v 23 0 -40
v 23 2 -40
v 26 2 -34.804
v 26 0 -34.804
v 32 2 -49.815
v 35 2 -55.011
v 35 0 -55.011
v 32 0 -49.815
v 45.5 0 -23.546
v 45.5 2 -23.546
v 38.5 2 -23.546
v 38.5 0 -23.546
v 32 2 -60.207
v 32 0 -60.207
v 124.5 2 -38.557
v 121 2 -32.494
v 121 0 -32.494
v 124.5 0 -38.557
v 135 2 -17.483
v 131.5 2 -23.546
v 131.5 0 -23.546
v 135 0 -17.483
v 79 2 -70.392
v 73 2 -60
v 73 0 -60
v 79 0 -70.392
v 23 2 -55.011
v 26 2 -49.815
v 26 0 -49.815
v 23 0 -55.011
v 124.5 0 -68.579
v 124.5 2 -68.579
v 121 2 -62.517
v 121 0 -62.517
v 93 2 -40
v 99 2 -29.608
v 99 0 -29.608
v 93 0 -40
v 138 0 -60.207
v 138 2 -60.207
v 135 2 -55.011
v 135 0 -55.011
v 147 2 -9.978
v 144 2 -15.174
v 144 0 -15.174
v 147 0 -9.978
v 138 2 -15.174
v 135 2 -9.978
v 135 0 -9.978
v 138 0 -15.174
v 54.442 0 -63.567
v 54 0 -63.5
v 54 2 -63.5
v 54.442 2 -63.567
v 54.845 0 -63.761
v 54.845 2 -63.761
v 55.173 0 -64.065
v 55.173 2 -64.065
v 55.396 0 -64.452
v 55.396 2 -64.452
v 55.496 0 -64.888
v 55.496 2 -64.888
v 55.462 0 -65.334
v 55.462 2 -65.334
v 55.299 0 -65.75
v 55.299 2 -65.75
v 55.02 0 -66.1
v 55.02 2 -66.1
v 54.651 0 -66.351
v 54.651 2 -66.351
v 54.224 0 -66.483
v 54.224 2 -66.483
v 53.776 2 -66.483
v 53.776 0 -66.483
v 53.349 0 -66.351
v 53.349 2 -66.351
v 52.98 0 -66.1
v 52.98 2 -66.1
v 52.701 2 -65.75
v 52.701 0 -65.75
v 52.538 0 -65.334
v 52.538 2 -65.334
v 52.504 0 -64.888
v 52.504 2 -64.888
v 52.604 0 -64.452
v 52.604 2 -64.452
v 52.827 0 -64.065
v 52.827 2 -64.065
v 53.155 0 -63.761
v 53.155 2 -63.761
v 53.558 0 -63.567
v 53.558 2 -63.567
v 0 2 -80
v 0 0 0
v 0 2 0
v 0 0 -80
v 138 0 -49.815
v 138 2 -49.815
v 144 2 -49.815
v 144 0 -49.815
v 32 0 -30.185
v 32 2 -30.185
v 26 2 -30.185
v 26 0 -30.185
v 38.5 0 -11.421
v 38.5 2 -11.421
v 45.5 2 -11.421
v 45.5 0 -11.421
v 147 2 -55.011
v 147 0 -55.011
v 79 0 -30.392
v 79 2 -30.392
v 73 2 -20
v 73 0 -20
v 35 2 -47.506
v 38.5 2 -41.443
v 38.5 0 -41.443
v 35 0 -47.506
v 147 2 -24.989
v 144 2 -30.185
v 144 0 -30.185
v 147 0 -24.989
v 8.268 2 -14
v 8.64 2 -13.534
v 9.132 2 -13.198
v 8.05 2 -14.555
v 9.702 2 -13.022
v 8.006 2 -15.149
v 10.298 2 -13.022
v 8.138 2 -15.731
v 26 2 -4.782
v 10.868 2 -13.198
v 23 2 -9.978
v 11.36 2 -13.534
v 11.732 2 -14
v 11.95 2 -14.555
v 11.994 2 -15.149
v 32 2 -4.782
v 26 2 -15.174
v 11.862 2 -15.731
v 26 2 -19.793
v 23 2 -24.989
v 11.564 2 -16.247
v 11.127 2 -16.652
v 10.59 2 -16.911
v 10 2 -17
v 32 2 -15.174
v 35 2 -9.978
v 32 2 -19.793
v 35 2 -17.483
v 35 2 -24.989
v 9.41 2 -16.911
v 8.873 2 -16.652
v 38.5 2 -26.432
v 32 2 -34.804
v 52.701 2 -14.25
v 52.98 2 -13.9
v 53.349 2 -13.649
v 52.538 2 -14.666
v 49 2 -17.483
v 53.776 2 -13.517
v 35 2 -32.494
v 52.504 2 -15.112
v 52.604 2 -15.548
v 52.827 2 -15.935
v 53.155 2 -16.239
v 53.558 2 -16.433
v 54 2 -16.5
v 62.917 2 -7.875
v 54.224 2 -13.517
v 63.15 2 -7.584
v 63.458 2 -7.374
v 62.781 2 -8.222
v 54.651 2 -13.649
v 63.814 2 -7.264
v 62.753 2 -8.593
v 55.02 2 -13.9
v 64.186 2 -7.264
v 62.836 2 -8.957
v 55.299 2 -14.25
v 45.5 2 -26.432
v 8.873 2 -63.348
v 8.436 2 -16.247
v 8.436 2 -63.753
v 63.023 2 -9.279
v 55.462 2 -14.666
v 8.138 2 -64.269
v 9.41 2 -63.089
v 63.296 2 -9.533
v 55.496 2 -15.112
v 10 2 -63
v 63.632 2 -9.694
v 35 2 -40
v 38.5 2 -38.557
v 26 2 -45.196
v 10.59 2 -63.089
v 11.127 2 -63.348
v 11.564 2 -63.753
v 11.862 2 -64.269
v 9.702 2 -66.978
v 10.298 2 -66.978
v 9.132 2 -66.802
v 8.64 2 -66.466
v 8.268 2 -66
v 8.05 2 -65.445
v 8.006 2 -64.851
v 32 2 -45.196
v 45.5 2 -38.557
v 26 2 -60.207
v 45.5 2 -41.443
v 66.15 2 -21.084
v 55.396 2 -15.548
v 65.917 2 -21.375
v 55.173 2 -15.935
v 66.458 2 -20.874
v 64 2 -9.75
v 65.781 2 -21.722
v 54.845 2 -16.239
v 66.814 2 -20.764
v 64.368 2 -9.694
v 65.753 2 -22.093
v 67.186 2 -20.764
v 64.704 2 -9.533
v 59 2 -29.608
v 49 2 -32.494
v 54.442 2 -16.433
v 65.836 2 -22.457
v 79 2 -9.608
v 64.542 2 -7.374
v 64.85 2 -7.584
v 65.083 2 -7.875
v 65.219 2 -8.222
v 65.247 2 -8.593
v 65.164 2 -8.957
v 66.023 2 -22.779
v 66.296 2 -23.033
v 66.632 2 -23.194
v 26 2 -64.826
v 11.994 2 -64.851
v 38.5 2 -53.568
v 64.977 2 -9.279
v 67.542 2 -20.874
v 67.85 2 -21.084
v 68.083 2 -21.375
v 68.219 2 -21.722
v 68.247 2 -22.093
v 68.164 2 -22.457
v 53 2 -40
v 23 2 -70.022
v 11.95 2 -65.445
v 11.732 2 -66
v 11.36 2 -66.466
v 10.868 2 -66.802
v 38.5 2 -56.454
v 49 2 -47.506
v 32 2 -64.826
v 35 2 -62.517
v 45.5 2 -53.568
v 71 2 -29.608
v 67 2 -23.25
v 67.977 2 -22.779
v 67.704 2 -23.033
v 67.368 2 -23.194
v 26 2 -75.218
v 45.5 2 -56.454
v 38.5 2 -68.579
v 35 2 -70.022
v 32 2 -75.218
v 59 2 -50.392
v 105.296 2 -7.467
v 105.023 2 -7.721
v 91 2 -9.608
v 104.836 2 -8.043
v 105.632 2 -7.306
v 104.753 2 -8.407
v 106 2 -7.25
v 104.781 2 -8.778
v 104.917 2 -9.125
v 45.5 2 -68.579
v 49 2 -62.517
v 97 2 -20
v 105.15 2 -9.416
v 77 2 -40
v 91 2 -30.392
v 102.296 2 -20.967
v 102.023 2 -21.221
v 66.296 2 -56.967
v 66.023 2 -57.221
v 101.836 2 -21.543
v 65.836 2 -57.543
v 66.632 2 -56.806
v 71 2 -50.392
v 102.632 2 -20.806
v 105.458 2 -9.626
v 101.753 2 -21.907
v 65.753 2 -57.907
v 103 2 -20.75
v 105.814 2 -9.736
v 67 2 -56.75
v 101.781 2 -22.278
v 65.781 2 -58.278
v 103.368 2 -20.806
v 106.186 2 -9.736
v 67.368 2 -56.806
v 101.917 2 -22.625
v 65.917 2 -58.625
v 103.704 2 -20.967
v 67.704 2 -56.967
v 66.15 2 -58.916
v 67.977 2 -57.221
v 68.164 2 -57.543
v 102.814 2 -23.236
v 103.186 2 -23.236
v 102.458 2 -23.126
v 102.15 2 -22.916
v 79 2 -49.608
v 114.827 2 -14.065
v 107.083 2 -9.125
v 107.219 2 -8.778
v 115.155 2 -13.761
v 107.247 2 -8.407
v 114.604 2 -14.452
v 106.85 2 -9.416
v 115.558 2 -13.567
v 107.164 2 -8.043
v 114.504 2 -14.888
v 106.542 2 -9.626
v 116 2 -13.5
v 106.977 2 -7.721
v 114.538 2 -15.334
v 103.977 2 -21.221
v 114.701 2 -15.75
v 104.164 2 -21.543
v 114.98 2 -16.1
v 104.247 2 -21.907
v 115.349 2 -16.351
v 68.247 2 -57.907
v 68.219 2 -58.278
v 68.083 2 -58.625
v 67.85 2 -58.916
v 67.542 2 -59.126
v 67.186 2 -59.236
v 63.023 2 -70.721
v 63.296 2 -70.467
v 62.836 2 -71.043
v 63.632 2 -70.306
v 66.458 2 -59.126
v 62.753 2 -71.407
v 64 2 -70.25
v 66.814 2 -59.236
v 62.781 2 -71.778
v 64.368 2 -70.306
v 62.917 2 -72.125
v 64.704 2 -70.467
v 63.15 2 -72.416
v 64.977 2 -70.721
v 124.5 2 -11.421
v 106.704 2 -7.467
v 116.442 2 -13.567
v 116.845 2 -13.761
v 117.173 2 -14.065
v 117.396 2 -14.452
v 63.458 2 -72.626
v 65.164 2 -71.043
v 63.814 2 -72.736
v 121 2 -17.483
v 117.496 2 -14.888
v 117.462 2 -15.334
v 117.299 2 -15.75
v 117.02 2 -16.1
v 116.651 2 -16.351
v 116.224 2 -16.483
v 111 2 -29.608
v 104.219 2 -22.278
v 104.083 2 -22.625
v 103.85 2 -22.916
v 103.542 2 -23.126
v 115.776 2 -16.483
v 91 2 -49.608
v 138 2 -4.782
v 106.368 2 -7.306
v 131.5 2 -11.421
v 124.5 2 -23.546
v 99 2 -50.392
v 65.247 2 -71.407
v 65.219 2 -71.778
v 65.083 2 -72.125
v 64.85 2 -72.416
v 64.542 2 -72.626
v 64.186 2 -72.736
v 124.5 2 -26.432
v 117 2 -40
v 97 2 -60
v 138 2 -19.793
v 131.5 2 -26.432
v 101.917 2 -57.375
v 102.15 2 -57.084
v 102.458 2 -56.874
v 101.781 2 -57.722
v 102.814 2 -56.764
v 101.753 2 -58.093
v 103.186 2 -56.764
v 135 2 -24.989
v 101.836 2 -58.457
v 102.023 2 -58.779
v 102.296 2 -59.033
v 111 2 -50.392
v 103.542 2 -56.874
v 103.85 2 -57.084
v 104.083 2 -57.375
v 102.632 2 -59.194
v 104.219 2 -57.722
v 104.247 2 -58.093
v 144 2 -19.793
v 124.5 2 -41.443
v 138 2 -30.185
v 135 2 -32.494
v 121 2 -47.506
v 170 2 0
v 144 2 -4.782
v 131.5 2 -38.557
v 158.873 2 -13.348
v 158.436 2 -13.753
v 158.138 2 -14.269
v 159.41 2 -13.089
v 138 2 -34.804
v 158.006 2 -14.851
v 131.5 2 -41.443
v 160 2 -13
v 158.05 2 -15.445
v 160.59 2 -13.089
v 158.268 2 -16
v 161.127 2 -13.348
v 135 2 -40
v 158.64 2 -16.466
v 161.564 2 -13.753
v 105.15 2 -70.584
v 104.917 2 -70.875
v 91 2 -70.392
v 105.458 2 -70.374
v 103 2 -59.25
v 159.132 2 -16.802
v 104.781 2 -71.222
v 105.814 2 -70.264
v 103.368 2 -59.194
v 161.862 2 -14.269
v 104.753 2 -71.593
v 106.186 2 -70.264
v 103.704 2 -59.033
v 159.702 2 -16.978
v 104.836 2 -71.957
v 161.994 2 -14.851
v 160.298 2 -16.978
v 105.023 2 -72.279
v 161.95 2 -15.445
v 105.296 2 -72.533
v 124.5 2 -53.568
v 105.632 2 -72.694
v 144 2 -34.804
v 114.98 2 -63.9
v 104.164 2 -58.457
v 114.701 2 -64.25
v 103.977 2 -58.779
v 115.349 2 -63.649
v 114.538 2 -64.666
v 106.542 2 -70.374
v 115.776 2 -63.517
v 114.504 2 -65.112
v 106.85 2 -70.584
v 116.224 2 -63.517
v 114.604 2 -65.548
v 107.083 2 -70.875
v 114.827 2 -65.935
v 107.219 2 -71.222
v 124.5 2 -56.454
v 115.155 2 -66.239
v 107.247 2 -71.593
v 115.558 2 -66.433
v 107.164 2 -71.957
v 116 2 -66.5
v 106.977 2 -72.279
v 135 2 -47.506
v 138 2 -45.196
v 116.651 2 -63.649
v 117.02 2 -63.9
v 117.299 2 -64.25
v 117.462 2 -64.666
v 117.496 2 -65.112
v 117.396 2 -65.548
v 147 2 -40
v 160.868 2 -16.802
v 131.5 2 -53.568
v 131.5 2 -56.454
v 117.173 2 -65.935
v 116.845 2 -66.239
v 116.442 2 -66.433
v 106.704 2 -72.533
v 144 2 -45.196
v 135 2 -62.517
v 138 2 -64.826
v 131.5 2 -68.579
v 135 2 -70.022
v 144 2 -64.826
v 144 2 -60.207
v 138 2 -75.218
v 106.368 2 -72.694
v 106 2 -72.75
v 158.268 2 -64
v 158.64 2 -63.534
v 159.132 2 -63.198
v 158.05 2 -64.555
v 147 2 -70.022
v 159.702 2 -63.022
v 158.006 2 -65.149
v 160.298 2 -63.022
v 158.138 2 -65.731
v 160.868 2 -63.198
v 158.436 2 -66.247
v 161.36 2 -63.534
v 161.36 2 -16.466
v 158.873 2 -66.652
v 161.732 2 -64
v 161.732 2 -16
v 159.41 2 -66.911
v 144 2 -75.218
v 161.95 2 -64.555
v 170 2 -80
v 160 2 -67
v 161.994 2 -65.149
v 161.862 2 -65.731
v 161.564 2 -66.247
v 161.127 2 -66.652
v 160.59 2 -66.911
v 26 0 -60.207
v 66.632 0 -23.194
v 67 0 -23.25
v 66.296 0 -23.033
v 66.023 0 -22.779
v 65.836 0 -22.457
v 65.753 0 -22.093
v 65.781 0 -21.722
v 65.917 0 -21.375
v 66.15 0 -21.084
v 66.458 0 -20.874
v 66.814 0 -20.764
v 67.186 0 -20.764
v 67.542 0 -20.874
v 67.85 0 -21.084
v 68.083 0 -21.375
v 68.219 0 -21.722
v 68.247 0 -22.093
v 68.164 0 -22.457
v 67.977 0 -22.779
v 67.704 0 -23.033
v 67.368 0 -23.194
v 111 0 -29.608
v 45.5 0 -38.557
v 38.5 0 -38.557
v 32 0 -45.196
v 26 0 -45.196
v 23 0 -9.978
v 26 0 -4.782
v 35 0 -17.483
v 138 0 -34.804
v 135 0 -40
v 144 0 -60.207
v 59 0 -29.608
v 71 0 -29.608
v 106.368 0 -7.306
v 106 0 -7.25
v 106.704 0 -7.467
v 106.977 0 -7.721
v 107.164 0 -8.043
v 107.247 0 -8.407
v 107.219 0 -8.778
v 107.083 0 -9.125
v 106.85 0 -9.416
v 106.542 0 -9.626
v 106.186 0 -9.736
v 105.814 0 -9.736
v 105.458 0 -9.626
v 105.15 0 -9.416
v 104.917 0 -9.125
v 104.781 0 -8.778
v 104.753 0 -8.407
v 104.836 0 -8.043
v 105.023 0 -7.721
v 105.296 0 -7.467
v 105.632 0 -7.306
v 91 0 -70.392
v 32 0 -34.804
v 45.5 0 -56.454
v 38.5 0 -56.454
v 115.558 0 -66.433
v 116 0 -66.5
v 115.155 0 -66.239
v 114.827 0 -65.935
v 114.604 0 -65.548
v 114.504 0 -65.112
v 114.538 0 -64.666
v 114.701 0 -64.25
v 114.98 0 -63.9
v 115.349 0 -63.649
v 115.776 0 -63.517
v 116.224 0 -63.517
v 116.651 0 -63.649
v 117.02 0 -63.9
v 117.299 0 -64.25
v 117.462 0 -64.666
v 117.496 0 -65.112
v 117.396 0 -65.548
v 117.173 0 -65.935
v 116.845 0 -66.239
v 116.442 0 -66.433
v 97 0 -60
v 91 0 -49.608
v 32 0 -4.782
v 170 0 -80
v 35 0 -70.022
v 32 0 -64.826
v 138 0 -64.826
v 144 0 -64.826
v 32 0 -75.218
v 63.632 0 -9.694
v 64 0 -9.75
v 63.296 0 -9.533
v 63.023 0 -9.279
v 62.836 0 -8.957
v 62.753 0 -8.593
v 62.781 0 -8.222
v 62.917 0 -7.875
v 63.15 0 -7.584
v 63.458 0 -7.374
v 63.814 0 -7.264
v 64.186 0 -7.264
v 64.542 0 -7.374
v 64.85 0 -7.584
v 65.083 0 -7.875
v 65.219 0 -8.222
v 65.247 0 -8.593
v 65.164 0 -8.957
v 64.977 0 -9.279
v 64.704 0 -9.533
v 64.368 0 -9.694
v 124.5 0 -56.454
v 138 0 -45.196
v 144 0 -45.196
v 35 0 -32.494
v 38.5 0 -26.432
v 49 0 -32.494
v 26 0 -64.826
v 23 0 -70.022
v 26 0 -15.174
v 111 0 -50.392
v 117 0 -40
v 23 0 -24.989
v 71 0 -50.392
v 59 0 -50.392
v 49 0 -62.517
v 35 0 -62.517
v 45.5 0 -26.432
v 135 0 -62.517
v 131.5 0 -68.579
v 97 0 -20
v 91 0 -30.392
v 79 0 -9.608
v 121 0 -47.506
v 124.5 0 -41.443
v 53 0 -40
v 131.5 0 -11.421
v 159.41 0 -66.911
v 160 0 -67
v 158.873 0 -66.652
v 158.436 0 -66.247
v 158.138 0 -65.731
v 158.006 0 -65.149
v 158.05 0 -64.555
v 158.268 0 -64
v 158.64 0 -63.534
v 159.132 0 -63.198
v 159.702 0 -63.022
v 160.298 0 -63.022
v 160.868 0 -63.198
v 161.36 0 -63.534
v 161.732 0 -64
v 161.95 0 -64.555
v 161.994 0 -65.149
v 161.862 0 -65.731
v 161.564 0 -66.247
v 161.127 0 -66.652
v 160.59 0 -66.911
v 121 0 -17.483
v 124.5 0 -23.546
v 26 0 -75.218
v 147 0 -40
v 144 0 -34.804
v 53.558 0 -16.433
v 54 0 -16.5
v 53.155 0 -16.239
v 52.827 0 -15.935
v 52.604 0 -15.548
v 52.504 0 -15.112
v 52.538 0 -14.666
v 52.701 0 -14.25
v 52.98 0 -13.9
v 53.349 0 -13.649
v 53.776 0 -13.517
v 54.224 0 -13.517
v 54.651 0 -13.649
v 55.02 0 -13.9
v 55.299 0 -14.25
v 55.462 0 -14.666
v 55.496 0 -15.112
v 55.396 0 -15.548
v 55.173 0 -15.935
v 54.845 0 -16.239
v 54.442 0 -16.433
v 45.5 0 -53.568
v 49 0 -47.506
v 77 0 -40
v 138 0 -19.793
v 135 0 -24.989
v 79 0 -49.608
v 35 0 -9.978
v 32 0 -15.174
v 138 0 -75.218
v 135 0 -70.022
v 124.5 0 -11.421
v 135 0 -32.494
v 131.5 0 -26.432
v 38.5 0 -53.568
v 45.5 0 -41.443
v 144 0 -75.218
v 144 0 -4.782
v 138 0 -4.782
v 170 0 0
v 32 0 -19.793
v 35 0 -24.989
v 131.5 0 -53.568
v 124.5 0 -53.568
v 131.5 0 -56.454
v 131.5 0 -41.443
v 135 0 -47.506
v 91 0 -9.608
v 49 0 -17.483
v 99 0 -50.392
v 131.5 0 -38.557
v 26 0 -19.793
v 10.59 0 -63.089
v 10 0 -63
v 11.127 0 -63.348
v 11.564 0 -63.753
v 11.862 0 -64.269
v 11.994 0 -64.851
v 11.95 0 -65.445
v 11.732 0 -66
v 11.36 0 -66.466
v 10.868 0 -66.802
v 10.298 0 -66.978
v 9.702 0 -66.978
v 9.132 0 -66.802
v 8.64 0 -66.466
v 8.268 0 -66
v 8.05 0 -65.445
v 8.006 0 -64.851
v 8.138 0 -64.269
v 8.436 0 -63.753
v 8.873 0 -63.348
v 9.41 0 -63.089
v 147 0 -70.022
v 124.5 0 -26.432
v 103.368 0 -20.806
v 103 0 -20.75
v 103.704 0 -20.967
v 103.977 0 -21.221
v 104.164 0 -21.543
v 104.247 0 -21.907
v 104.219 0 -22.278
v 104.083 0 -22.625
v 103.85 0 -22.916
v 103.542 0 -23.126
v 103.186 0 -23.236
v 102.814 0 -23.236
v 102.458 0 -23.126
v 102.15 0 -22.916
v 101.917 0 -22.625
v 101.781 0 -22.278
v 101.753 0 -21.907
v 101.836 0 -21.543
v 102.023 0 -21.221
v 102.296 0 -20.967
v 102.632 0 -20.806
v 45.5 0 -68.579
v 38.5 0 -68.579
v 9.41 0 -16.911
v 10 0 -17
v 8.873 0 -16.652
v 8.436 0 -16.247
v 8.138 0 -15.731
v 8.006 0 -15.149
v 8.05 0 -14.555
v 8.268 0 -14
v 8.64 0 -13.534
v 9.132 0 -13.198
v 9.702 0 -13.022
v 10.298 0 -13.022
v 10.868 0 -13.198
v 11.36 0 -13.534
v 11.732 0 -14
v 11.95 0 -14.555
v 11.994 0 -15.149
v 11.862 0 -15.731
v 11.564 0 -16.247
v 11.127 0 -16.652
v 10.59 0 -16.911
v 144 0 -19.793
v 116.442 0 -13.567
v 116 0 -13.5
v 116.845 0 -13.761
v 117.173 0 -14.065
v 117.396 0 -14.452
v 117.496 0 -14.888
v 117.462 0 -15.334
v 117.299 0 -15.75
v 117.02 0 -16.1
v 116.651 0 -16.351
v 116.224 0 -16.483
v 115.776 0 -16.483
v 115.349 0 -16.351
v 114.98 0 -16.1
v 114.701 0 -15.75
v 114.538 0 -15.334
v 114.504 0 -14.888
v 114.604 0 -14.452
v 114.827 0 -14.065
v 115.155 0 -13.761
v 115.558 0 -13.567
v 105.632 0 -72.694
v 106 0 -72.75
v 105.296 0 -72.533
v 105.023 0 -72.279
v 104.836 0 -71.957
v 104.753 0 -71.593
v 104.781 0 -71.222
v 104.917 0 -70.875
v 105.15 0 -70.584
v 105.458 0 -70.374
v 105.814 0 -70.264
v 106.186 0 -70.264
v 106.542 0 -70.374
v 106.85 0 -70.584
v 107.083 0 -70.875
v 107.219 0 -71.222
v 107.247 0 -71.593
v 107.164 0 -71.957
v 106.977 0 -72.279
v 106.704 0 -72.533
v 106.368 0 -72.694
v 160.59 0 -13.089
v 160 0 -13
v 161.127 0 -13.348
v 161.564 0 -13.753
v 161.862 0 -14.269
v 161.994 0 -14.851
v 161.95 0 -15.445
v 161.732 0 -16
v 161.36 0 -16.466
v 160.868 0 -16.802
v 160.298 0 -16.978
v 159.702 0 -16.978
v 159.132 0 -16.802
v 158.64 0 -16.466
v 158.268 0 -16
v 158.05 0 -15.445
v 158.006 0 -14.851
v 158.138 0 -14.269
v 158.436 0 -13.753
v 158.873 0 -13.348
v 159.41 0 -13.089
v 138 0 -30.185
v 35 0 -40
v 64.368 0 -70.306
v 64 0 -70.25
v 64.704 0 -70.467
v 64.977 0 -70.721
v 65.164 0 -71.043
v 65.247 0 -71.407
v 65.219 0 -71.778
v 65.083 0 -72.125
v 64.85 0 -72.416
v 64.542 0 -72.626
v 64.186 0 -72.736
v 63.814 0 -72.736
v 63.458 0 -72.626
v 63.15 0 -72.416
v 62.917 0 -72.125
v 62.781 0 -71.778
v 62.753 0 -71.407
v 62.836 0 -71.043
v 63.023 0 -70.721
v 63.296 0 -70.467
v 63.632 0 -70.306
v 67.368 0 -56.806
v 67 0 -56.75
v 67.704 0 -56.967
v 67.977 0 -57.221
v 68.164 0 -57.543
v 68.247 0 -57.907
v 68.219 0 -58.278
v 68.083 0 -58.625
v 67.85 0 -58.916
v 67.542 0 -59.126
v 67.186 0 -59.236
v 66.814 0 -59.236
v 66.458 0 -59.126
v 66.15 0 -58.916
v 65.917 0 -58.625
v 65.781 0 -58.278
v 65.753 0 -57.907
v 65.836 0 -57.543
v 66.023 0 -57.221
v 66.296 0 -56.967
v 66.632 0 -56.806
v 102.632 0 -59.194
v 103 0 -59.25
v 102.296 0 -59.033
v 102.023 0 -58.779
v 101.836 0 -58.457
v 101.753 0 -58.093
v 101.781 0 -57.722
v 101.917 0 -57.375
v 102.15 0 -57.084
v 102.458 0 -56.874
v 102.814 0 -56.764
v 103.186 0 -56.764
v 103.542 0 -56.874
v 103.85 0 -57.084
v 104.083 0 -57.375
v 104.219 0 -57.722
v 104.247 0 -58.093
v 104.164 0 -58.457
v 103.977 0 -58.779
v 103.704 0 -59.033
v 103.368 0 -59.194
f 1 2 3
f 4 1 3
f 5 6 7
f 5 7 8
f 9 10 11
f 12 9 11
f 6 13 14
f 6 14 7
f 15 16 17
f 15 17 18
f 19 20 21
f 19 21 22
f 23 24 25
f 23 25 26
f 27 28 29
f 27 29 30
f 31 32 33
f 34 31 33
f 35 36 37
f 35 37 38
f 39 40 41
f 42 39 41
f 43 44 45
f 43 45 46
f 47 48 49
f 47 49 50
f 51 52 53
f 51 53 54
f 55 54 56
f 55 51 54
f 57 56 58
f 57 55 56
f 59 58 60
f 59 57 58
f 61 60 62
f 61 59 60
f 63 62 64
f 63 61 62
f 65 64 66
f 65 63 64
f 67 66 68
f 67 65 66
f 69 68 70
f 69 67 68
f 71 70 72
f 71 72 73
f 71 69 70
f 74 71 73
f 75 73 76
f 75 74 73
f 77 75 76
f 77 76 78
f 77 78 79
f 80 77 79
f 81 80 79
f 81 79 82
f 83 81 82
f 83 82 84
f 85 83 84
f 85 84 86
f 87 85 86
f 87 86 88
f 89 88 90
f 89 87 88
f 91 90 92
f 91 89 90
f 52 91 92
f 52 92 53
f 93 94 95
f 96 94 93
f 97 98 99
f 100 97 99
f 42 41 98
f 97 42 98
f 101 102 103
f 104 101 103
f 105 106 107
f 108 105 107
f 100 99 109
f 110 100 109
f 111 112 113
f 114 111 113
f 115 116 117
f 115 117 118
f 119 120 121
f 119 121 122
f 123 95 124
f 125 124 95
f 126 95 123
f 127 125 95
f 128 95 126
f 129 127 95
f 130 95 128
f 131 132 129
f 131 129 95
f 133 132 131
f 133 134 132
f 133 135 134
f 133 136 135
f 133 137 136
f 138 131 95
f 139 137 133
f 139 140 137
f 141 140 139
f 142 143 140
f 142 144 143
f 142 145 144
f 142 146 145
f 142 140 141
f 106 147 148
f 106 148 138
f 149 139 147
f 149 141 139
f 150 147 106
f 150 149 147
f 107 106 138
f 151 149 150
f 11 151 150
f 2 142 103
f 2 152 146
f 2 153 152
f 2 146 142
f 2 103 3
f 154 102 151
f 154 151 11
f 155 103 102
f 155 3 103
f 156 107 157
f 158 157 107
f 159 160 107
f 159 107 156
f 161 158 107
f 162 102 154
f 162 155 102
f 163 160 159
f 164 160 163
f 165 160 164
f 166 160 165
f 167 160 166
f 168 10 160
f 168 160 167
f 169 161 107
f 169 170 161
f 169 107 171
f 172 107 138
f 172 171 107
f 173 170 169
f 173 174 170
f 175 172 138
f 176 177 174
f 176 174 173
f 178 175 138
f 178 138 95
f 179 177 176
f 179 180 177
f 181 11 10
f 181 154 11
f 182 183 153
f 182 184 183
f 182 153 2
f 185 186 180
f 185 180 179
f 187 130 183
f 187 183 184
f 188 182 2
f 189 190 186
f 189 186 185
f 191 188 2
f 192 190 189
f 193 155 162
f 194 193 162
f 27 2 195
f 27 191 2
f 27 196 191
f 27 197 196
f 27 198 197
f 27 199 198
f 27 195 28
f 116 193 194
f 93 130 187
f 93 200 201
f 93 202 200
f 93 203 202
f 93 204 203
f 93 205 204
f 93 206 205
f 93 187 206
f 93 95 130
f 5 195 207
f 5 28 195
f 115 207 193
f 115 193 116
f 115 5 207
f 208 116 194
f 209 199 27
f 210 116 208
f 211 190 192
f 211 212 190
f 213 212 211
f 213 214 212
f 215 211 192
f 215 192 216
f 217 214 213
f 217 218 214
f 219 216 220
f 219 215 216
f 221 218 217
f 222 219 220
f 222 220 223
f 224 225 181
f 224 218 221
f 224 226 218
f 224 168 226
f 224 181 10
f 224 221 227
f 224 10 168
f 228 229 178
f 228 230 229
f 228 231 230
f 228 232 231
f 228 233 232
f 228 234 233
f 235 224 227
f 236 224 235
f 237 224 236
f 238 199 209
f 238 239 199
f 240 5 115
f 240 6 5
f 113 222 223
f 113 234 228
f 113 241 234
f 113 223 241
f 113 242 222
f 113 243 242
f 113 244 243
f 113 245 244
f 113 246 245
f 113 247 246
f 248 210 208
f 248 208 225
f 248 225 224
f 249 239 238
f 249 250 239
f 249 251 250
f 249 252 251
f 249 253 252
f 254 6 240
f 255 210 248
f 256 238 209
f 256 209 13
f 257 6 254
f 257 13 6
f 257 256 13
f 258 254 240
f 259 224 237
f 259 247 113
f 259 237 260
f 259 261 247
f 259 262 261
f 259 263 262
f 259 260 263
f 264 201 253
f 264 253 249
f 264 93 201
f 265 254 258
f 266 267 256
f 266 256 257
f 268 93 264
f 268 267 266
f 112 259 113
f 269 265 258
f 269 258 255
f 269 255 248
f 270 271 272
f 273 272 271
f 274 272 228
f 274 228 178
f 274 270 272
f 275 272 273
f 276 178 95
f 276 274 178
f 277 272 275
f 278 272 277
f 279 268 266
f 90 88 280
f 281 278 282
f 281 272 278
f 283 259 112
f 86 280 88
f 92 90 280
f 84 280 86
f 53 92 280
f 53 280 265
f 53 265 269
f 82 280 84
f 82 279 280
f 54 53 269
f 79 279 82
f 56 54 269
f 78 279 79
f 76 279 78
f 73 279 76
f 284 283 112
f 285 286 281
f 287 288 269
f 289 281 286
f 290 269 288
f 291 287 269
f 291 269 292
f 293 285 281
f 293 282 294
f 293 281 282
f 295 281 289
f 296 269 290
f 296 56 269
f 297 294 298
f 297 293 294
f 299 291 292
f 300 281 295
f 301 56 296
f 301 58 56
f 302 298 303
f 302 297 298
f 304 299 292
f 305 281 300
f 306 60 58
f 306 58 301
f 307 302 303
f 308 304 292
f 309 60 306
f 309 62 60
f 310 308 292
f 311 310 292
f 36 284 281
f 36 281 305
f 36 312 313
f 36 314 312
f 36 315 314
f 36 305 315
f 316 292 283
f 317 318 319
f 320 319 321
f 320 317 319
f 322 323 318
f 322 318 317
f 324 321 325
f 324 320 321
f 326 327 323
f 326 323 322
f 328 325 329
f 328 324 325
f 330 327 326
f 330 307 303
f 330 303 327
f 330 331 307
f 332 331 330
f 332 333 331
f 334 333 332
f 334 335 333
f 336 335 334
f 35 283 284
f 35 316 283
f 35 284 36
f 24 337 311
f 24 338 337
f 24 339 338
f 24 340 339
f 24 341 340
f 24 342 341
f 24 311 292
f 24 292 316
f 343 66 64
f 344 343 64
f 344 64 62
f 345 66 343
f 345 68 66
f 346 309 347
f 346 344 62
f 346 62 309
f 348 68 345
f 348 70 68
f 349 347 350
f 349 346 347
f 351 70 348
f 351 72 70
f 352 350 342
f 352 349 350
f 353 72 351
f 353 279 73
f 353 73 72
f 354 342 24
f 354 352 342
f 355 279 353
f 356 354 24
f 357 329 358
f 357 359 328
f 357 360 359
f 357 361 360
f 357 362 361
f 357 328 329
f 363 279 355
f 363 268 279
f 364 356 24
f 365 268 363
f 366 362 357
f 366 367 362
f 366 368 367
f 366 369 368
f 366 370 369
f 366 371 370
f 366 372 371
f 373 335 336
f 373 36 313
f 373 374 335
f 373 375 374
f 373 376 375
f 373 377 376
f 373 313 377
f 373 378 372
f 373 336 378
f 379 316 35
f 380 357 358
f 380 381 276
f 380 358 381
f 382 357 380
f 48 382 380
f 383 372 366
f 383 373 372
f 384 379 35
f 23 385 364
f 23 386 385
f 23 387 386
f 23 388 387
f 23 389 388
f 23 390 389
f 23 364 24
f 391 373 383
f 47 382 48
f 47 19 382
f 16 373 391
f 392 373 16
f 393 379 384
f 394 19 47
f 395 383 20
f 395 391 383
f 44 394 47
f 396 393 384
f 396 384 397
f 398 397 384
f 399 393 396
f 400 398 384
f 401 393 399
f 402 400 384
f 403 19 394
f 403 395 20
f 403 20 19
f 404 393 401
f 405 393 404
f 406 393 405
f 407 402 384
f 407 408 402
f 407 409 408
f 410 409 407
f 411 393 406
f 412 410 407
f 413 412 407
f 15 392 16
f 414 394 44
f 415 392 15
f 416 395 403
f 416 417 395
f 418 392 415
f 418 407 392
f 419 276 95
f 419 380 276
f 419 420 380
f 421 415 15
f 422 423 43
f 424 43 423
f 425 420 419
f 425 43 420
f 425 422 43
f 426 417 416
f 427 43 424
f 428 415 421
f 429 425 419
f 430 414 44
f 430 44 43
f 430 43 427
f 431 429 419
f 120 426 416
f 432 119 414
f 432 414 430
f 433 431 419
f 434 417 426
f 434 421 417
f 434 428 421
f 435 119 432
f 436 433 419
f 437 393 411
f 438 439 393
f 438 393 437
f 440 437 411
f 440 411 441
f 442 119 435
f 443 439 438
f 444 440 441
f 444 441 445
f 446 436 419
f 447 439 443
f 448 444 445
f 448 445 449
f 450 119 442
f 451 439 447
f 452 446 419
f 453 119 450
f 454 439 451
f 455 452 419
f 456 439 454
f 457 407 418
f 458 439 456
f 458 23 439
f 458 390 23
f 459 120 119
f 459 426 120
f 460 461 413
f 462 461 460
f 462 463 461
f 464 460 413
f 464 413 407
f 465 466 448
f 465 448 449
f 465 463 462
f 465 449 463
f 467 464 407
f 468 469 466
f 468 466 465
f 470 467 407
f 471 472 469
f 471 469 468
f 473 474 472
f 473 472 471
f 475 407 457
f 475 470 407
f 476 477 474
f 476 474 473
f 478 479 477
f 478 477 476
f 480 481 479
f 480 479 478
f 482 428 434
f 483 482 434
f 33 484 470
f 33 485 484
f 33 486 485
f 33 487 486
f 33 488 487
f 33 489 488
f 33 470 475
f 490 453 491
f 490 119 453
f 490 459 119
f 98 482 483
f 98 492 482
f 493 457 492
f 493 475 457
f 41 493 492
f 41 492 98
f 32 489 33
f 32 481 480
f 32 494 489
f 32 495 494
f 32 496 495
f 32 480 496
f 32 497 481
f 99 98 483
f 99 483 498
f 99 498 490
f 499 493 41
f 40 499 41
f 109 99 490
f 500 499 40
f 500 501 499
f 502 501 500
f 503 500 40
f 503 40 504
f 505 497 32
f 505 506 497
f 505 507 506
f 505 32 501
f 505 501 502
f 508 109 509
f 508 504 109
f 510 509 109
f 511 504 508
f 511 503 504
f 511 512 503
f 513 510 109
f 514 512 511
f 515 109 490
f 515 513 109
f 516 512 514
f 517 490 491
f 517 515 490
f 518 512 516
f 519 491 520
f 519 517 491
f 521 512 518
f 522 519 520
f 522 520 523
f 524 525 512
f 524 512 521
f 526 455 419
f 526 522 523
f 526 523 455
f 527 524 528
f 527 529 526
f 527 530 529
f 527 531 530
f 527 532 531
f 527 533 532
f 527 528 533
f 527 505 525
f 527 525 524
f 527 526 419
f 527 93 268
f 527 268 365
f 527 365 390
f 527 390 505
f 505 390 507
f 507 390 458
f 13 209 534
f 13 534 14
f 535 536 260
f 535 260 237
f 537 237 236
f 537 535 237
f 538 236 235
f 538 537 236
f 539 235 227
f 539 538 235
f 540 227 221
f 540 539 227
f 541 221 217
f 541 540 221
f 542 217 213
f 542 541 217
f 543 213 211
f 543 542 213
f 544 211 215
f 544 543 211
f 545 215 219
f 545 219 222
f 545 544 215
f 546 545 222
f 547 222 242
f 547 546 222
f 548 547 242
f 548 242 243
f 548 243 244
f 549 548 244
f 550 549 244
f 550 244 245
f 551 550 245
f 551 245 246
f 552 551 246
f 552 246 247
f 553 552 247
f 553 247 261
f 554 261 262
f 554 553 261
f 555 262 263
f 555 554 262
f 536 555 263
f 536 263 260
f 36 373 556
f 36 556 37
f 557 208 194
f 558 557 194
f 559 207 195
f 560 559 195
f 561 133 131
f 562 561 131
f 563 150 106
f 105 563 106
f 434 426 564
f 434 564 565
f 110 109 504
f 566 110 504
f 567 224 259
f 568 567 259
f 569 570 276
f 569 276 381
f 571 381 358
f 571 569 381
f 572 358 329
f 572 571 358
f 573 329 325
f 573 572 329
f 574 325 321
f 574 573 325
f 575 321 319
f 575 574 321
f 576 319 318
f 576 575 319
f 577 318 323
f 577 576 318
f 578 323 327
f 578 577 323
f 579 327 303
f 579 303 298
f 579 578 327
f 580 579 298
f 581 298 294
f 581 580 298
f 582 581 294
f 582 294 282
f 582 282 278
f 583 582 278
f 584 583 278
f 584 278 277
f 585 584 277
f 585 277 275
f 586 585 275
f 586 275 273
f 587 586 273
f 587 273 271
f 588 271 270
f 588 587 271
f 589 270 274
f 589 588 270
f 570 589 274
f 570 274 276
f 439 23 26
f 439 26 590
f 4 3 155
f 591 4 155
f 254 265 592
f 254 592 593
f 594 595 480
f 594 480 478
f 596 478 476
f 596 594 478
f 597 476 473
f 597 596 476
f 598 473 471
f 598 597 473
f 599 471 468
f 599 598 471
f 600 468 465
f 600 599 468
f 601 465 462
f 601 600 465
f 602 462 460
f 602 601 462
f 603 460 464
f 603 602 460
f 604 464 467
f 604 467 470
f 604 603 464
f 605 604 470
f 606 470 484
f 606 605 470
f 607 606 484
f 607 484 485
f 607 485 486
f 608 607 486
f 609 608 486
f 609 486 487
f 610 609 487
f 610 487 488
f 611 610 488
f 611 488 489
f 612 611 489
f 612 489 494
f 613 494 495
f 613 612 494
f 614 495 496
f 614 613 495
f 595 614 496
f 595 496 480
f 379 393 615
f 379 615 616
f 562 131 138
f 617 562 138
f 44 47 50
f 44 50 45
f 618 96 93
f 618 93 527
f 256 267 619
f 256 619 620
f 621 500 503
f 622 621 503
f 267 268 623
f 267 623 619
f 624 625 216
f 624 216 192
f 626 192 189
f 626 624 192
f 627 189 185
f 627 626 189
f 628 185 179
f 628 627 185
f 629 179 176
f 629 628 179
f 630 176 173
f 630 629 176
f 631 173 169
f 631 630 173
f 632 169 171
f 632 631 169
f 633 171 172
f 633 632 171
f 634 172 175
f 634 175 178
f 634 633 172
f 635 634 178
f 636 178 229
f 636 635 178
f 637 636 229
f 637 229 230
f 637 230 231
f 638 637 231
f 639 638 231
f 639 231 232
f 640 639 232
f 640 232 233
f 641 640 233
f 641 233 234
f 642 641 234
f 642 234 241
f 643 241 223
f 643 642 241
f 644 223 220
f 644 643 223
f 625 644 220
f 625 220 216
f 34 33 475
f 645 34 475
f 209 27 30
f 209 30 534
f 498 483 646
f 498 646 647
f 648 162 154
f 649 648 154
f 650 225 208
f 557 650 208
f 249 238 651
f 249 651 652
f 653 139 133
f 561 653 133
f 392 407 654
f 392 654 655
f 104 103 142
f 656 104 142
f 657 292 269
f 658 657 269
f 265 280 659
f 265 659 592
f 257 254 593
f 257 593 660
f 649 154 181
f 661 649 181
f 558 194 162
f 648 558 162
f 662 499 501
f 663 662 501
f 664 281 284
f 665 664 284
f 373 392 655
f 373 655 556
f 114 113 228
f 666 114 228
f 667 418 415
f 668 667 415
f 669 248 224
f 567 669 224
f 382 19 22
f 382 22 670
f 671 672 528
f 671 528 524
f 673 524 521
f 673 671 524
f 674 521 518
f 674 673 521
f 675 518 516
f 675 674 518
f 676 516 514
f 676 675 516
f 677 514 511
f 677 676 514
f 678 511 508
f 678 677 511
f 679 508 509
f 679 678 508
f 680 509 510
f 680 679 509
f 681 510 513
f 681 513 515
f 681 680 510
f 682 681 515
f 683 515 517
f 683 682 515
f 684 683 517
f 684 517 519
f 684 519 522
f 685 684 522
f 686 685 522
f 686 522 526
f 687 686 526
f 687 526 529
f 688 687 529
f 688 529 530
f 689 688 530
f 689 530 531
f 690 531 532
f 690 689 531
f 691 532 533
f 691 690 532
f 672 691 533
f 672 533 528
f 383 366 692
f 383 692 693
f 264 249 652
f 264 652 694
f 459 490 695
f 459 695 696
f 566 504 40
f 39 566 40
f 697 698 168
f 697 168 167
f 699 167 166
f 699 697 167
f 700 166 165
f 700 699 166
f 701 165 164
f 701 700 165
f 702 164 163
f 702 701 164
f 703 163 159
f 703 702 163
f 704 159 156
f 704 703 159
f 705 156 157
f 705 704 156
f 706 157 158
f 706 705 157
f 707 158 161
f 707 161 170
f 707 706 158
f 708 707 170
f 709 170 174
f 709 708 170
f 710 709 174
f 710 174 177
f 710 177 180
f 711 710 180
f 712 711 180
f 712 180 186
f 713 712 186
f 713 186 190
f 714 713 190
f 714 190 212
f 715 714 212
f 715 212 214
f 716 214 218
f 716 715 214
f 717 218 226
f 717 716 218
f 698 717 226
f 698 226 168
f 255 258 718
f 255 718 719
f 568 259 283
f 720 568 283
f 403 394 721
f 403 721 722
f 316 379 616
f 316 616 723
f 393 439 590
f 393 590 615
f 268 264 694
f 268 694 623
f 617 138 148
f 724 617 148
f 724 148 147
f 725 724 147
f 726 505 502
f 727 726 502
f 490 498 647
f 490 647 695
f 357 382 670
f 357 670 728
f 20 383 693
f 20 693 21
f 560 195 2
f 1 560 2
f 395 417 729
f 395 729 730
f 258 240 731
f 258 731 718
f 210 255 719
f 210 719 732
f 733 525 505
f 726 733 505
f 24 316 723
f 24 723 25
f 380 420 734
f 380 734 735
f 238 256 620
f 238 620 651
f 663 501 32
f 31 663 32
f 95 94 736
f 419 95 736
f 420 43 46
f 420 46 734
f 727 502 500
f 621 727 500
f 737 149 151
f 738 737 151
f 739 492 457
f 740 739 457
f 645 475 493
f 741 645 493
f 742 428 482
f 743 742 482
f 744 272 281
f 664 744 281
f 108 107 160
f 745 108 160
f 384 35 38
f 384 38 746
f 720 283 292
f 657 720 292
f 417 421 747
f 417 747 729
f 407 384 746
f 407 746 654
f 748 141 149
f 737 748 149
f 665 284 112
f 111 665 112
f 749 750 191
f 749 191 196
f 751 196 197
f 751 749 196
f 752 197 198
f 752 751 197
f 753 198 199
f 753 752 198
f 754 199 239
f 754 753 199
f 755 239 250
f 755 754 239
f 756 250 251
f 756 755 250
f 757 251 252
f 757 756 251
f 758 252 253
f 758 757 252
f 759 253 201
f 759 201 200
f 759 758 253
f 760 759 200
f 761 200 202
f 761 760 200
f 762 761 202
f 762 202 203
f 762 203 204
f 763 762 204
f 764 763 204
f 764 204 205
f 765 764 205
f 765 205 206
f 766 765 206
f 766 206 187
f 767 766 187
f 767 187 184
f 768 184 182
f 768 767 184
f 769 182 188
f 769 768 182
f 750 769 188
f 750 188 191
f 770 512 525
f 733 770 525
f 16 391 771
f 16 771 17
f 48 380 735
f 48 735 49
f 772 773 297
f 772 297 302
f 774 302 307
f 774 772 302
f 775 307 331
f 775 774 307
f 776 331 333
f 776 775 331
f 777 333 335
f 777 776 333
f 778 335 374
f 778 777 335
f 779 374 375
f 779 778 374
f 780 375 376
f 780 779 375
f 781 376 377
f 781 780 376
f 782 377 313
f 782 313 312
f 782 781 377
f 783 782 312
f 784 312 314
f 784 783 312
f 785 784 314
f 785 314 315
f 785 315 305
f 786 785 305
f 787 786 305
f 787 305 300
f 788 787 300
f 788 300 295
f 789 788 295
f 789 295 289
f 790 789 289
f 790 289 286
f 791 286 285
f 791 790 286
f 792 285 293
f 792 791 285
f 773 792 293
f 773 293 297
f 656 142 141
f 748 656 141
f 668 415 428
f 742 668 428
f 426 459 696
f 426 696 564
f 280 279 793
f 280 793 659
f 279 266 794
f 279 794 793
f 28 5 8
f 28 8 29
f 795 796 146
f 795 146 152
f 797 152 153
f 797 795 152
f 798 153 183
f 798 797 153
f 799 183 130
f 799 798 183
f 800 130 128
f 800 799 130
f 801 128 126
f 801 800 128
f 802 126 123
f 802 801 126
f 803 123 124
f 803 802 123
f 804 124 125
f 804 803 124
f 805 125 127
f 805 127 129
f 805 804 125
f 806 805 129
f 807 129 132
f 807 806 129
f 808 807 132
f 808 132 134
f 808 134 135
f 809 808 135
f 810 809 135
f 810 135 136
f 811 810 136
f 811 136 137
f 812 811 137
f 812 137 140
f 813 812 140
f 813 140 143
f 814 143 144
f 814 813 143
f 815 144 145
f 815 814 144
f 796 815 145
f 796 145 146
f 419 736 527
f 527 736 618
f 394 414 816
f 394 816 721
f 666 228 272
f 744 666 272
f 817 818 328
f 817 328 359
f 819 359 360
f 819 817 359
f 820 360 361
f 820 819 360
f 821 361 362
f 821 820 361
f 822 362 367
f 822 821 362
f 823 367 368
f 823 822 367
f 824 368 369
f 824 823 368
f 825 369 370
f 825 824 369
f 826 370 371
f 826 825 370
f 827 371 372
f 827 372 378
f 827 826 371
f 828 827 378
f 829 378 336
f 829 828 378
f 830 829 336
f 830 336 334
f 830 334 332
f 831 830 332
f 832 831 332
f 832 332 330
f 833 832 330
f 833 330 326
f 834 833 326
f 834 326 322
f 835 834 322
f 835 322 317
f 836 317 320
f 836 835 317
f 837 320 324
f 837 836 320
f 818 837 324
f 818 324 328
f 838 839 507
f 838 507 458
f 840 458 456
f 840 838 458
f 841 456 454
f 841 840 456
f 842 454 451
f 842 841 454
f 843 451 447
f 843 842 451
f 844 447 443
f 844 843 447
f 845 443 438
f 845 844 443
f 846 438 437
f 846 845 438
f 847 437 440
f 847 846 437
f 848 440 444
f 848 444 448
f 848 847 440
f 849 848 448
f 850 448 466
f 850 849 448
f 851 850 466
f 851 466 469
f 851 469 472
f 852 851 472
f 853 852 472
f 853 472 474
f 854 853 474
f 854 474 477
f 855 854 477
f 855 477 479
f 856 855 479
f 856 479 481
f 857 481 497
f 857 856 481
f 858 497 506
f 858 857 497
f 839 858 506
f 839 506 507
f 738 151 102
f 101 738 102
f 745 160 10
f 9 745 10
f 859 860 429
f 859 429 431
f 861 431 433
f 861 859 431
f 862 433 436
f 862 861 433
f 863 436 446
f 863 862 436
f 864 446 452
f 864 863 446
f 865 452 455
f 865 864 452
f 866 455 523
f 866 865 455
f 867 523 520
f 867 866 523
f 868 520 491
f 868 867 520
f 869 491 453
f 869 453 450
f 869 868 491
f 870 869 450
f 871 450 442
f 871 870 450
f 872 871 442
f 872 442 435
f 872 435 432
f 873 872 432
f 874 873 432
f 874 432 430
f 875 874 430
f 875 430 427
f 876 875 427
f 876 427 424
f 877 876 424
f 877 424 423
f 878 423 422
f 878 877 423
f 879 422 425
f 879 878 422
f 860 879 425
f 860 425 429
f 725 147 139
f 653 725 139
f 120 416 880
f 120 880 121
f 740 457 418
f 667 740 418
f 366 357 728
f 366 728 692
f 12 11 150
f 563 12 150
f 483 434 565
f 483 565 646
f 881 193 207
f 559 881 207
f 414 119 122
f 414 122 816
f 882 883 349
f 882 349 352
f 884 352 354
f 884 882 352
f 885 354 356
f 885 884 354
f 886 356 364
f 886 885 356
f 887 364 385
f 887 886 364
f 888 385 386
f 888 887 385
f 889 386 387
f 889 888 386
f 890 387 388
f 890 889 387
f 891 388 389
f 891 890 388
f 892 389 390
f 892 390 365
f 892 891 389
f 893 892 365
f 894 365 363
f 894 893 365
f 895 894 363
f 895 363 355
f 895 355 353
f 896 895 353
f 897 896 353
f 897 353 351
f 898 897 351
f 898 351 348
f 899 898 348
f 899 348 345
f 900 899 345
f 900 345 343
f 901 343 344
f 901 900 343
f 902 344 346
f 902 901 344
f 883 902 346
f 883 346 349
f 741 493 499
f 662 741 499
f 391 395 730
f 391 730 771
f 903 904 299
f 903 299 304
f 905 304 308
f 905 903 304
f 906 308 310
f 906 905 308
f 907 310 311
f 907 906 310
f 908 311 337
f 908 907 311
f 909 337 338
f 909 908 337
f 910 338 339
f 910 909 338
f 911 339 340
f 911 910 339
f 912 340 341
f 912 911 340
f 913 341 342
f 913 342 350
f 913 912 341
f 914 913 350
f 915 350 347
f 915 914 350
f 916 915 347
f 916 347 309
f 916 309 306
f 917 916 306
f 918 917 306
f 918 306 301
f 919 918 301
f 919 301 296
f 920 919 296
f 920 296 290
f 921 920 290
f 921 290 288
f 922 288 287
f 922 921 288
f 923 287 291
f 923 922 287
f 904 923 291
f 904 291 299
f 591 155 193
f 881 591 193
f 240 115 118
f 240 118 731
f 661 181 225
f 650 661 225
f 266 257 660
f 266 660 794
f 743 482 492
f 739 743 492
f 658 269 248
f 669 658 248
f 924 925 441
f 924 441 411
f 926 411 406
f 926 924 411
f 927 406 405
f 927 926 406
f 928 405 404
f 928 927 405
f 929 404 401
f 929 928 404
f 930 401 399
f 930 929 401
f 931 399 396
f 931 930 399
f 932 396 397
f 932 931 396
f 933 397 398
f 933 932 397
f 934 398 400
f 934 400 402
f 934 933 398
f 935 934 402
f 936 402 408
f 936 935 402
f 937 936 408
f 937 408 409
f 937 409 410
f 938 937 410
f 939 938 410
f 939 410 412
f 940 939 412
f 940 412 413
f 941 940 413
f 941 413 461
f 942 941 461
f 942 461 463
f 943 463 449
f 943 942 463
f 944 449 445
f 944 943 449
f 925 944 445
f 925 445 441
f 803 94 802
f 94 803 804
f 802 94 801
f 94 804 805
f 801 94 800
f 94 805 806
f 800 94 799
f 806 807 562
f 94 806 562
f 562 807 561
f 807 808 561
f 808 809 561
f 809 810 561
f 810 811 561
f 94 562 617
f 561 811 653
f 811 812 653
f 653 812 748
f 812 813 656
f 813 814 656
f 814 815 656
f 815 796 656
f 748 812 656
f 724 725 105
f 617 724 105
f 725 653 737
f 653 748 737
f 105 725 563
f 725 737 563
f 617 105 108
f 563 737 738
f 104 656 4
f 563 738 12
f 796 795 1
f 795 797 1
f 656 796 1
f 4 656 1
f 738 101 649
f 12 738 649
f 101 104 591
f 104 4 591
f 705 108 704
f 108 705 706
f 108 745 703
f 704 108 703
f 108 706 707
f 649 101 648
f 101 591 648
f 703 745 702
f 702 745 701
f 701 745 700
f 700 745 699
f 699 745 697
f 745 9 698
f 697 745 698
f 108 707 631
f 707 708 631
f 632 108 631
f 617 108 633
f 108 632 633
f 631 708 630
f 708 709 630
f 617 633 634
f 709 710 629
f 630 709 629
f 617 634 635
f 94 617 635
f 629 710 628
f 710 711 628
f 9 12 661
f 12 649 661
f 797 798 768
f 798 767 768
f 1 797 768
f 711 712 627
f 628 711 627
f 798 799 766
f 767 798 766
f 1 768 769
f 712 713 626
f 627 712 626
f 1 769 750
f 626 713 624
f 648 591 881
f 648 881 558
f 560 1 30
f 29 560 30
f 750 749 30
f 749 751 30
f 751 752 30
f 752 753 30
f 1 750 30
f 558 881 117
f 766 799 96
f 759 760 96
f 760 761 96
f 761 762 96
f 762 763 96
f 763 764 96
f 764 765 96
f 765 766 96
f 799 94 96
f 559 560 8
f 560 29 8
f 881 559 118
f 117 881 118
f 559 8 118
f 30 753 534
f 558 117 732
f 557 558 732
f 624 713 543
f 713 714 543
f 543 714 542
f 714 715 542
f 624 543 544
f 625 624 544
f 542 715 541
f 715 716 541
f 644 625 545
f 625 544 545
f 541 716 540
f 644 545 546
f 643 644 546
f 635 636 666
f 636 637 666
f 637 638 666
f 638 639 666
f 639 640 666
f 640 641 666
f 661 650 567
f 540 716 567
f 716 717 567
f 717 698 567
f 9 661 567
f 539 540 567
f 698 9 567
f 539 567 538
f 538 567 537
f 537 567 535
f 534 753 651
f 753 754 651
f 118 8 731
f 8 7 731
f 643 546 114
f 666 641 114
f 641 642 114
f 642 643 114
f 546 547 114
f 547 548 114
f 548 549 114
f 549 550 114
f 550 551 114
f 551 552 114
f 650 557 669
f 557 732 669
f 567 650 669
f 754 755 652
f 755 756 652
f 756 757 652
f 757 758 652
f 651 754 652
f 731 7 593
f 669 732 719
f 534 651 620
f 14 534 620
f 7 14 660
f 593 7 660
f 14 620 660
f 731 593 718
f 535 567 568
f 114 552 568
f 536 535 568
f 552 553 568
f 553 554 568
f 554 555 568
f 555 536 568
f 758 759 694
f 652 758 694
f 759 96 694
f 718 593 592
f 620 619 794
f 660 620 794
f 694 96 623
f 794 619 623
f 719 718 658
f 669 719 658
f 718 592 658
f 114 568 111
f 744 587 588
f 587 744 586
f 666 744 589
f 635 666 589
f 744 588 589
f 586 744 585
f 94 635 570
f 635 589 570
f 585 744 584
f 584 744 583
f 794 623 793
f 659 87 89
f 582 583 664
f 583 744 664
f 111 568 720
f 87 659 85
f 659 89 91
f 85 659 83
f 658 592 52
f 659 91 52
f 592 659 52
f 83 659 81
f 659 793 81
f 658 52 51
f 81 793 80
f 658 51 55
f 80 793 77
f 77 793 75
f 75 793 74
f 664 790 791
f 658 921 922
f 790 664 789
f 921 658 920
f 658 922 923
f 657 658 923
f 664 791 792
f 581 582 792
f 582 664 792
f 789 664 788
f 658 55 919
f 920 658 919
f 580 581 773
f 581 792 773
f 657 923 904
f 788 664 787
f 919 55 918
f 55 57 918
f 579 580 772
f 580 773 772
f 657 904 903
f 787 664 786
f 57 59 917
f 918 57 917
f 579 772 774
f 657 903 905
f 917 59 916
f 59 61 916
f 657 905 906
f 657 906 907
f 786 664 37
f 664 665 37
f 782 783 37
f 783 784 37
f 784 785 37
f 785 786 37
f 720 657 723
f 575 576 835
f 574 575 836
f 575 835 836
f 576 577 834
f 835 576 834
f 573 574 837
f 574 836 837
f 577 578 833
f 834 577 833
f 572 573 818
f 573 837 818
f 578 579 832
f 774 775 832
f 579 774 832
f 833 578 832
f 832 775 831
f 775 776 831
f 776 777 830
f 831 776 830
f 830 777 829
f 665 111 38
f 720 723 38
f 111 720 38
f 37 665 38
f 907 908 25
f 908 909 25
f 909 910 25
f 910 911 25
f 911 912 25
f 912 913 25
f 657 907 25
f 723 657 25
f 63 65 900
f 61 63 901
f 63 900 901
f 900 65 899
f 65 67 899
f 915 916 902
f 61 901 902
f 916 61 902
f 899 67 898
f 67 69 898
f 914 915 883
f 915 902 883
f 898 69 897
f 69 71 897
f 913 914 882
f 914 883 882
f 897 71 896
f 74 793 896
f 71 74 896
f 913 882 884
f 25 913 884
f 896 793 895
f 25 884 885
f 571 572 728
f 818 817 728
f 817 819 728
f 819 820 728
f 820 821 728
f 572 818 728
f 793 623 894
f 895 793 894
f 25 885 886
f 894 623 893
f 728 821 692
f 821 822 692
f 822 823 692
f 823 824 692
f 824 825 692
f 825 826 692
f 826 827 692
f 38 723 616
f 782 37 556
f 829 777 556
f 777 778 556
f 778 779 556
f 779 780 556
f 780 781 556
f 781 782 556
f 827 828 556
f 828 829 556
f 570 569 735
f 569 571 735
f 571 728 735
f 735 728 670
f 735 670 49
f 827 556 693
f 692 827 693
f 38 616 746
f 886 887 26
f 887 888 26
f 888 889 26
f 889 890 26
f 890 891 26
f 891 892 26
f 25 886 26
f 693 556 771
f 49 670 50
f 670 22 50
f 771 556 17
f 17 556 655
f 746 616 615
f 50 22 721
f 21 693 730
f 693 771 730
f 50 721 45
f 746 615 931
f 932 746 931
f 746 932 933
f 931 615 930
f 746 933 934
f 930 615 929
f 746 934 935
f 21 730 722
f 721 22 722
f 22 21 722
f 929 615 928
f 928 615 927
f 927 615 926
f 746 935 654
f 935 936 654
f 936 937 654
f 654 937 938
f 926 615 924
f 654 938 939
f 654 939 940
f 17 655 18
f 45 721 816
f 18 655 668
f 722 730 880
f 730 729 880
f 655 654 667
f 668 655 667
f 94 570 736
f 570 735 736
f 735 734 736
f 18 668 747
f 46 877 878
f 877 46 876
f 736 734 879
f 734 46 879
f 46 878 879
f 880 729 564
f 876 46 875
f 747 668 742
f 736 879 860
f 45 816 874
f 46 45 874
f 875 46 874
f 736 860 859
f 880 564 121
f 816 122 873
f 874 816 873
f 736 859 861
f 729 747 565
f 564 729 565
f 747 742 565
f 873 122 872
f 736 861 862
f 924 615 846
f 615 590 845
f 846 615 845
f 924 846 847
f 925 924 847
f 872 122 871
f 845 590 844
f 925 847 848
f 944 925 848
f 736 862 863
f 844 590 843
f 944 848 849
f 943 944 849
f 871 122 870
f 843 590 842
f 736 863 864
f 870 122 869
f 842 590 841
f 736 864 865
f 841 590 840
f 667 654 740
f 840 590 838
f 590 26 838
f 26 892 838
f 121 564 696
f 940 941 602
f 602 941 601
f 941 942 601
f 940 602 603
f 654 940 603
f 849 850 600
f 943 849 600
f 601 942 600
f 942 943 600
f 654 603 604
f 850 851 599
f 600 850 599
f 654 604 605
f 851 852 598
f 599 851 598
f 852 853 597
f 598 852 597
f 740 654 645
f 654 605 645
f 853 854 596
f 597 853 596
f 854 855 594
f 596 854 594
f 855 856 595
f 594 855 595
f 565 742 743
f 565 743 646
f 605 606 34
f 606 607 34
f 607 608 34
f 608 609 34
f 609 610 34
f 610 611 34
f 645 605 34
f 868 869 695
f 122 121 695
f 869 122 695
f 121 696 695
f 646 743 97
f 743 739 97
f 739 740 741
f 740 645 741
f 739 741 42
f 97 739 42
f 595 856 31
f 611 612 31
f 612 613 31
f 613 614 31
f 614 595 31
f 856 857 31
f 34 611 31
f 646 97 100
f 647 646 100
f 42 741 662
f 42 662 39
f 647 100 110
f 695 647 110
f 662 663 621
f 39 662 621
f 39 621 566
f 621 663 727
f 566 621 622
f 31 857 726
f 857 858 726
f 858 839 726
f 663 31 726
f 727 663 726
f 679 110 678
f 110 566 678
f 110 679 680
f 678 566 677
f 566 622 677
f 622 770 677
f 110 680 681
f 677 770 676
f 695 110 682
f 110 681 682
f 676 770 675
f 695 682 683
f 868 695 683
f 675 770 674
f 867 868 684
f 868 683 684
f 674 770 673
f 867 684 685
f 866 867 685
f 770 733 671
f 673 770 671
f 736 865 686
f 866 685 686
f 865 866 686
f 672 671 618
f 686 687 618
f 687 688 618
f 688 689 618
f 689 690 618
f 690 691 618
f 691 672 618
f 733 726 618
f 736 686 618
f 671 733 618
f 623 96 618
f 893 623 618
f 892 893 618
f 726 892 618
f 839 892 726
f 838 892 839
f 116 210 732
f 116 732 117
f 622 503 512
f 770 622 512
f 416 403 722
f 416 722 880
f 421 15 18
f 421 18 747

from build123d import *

# Parameters (mm, degrees)
SKETCH_1_W          = 170
SKETCH_1_H          = 80
SKETCH_1_R          = 2
SKETCH_1_R_2        = 1.25
SKETCH_1_R_3        = 1.5
EXTRUDE_1_DEPTH     = 2
CUT_EXTRUDE_1_DEPTH = 50
CUT_EXTRUDE_2_DEPTH = 50
CUT_EXTRUDE_3_DEPTH = 50


with BuildPart() as part:
    # 草图1 → 凸台-拉伸1 (new body)
    with BuildSketch(Plane(origin=(0, 0, 0), x_dir=(1, 0, 0), z_dir=(0, 1, 0))):
        with Locations((85, 40)):
            Rectangle(SKETCH_1_W, SKETCH_1_H)
        with Locations(Location((10, 65, 0), (0, 0, 270))):
            Circle(SKETCH_1_R, mode=Mode.SUBTRACT)
        with Locations(Location((10, 15, 0), (0, 0, 90))):
            Circle(SKETCH_1_R, mode=Mode.SUBTRACT)
        with Locations(Location((160, 15, 0), (0, 0, 270))):
            Circle(SKETCH_1_R, mode=Mode.SUBTRACT)
        with Locations(Location((160, 65, 0), (0, 0, 90))):
            Circle(SKETCH_1_R, mode=Mode.SUBTRACT)
        with Locations(Location((67, 58, 0), (0, 0, 270))):
            Circle(SKETCH_1_R_2, mode=Mode.SUBTRACT)
        with Locations(Location((67, 22, 0), (0, 0, 90))):
            Circle(SKETCH_1_R_2, mode=Mode.SUBTRACT)
        with Locations(Location((103, 22, 0), (0, 0, 270))):
            Circle(SKETCH_1_R_2, mode=Mode.SUBTRACT)
        with Locations(Location((103, 58, 0), (0, 0, 90))):
            Circle(SKETCH_1_R_2, mode=Mode.SUBTRACT)
        with Locations(Location((64, 71.5, 0), (0, 0, 270))):
            Circle(SKETCH_1_R_2, mode=Mode.SUBTRACT)
        with Locations(Location((64, 8.5, 0), (0, 0, 90))):
            Circle(SKETCH_1_R_2, mode=Mode.SUBTRACT)
        with Locations(Location((106, 8.5, 0), (0, 0, 270))):
            Circle(SKETCH_1_R_2, mode=Mode.SUBTRACT)
        with Locations(Location((106, 71.5, 0), (0, 0, 90))):
            Circle(SKETCH_1_R_2, mode=Mode.SUBTRACT)
        with Locations(Location((54, 65, 0), (0, 0, 270))):
            Circle(SKETCH_1_R_3, mode=Mode.SUBTRACT)
        with Locations(Location((54, 15, 0), (0, 0, 90))):
            Circle(SKETCH_1_R_3, mode=Mode.SUBTRACT)
        with Locations(Location((116, 15, 0), (0, 0, 270))):
            Circle(SKETCH_1_R_3, mode=Mode.SUBTRACT)
        with Locations(Location((116, 65, 0), (0, 0, 90))):
            Circle(SKETCH_1_R_3, mode=Mode.SUBTRACT)
    extrude(amount=EXTRUDE_1_DEPTH)

    # 草图3 → 切除-拉伸1 (cut)
    with BuildSketch(Plane(origin=(0, 2, 0), x_dir=(1, 0, 0), z_dir=(0, 1, 0))):
        Polygon((26, 15.173938425), (23, 9.977786002), (26, 4.781633579), (32, 4.781633579), (35, 9.977786002), (32, 15.173938425), align=None)
        Polygon((38.5, 23.545517328), (35, 17.483339502), (38.5, 11.421161675), (45.5, 11.421161675), (49, 17.483339502), (45.5, 23.545517328), align=None)
        Polygon((32, 30.185045424), (26, 30.185045424), (23, 24.988893001), (26, 19.792740578), (32, 19.792740578), (35, 24.988893001), align=None)
        Polygon((45.5, 38.556624327), (38.5, 38.556624327), (35, 32.494446501), (38.5, 26.432268674), (45.5, 26.432268674), (49, 32.494446501), align=None)
        Polygon((32, 45.196152423), (26, 45.196152423), (23, 40), (26, 34.803847577), (32, 34.803847577), (35, 40), align=None)
        Polygon((49, 47.505553499), (45.5, 41.443375673), (38.5, 41.443375673), (35, 47.505553499), (38.5, 53.567731326), (45.5, 53.567731326), align=None)
        Polygon((45.5, 56.454482672), (38.5, 56.454482672), (35, 62.516660498), (38.5, 68.578838325), (45.5, 68.578838325), (49, 62.516660498), align=None)
        Polygon((35, 55.011106999), (32, 49.814954576), (26, 49.814954576), (23, 55.011106999), (26, 60.207259422), (32, 60.207259422), align=None)
        Polygon((32, 64.826061575), (26, 64.826061575), (23, 70.022213998), (26, 75.218366421), (32, 75.218366421), (35, 70.022213998), align=None)
        Polygon((144, 64.826061575), (147, 70.022213998), (144, 75.218366421), (138, 75.218366421), (135, 70.022213998), (138, 64.826061575), align=None)
        Polygon((138, 49.814954576), (144, 49.814954576), (147, 55.011106999), (144, 60.207259422), (138, 60.207259422), (135, 55.011106999), align=None)
        Polygon((131.5, 56.454482672), (135, 62.516660498), (131.5, 68.578838325), (124.5, 68.578838325), (121, 62.516660498), (124.5, 56.454482672), align=None)
        Polygon((124.5, 41.443375673), (131.5, 41.443375673), (135, 47.505553499), (131.5, 53.567731326), (124.5, 53.567731326), (121, 47.505553499), align=None)
        Polygon((135, 40), (138, 45.196152423), (144, 45.196152423), (147, 40), (144, 34.803847577), (138, 34.803847577), align=None)
        Polygon((121, 32.494446501), (124.5, 38.556624327), (131.5, 38.556624327), (135, 32.494446501), (131.5, 26.432268674), (124.5, 26.432268674), align=None)
        Polygon((135, 24.988893001), (138, 30.185045424), (144, 30.185045424), (147, 24.988893001), (144, 19.792740578), (138, 19.792740578), align=None)
        Polygon((124.5, 23.545517328), (131.5, 23.545517328), (135, 17.483339502), (131.5, 11.421161675), (124.5, 11.421161675), (121, 17.483339502), align=None)
        Polygon((138, 15.173938425), (144, 15.173938425), (147, 9.977786002), (144, 4.781633579), (138, 4.781633579), (135, 9.977786002), align=None)
    extrude(amount=-CUT_EXTRUDE_1_DEPTH, mode=Mode.SUBTRACT)

    # 草图4 → 切除-拉伸2 (cut)
    with BuildSketch(Plane(origin=(0, 2, 0), x_dir=(1, 0, 0), z_dir=(0, 1, 0))):
        Polygon((77, 40), (71, 50.392304845), (59, 50.392304845), (53, 40), (59, 29.607695155), (71, 29.607695155), align=None)
        Polygon((99, 29.607695155), (93, 40), (99, 50.392304845), (111, 50.392304845), (117, 40), (111, 29.607695155), align=None)
    extrude(amount=-CUT_EXTRUDE_2_DEPTH, mode=Mode.SUBTRACT)

    # 草图5 → 切除-拉伸3 (cut)
    with BuildSketch(Plane(origin=(0, 2, 0), x_dir=(1, 0, 0), z_dir=(0, 1, 0))):
        Polygon((91, 30.392304845), (79, 30.392304845), (73, 20), (79, 9.607695155), (91, 9.607695155), (97, 20), align=None)
        Polygon((97, 60), (91, 49.607695155), (79, 49.607695155), (73, 60), (79, 70.392304845), (91, 70.392304845), align=None)
    extrude(amount=-CUT_EXTRUDE_3_DEPTH, mode=Mode.SUBTRACT)


solid = part.part
